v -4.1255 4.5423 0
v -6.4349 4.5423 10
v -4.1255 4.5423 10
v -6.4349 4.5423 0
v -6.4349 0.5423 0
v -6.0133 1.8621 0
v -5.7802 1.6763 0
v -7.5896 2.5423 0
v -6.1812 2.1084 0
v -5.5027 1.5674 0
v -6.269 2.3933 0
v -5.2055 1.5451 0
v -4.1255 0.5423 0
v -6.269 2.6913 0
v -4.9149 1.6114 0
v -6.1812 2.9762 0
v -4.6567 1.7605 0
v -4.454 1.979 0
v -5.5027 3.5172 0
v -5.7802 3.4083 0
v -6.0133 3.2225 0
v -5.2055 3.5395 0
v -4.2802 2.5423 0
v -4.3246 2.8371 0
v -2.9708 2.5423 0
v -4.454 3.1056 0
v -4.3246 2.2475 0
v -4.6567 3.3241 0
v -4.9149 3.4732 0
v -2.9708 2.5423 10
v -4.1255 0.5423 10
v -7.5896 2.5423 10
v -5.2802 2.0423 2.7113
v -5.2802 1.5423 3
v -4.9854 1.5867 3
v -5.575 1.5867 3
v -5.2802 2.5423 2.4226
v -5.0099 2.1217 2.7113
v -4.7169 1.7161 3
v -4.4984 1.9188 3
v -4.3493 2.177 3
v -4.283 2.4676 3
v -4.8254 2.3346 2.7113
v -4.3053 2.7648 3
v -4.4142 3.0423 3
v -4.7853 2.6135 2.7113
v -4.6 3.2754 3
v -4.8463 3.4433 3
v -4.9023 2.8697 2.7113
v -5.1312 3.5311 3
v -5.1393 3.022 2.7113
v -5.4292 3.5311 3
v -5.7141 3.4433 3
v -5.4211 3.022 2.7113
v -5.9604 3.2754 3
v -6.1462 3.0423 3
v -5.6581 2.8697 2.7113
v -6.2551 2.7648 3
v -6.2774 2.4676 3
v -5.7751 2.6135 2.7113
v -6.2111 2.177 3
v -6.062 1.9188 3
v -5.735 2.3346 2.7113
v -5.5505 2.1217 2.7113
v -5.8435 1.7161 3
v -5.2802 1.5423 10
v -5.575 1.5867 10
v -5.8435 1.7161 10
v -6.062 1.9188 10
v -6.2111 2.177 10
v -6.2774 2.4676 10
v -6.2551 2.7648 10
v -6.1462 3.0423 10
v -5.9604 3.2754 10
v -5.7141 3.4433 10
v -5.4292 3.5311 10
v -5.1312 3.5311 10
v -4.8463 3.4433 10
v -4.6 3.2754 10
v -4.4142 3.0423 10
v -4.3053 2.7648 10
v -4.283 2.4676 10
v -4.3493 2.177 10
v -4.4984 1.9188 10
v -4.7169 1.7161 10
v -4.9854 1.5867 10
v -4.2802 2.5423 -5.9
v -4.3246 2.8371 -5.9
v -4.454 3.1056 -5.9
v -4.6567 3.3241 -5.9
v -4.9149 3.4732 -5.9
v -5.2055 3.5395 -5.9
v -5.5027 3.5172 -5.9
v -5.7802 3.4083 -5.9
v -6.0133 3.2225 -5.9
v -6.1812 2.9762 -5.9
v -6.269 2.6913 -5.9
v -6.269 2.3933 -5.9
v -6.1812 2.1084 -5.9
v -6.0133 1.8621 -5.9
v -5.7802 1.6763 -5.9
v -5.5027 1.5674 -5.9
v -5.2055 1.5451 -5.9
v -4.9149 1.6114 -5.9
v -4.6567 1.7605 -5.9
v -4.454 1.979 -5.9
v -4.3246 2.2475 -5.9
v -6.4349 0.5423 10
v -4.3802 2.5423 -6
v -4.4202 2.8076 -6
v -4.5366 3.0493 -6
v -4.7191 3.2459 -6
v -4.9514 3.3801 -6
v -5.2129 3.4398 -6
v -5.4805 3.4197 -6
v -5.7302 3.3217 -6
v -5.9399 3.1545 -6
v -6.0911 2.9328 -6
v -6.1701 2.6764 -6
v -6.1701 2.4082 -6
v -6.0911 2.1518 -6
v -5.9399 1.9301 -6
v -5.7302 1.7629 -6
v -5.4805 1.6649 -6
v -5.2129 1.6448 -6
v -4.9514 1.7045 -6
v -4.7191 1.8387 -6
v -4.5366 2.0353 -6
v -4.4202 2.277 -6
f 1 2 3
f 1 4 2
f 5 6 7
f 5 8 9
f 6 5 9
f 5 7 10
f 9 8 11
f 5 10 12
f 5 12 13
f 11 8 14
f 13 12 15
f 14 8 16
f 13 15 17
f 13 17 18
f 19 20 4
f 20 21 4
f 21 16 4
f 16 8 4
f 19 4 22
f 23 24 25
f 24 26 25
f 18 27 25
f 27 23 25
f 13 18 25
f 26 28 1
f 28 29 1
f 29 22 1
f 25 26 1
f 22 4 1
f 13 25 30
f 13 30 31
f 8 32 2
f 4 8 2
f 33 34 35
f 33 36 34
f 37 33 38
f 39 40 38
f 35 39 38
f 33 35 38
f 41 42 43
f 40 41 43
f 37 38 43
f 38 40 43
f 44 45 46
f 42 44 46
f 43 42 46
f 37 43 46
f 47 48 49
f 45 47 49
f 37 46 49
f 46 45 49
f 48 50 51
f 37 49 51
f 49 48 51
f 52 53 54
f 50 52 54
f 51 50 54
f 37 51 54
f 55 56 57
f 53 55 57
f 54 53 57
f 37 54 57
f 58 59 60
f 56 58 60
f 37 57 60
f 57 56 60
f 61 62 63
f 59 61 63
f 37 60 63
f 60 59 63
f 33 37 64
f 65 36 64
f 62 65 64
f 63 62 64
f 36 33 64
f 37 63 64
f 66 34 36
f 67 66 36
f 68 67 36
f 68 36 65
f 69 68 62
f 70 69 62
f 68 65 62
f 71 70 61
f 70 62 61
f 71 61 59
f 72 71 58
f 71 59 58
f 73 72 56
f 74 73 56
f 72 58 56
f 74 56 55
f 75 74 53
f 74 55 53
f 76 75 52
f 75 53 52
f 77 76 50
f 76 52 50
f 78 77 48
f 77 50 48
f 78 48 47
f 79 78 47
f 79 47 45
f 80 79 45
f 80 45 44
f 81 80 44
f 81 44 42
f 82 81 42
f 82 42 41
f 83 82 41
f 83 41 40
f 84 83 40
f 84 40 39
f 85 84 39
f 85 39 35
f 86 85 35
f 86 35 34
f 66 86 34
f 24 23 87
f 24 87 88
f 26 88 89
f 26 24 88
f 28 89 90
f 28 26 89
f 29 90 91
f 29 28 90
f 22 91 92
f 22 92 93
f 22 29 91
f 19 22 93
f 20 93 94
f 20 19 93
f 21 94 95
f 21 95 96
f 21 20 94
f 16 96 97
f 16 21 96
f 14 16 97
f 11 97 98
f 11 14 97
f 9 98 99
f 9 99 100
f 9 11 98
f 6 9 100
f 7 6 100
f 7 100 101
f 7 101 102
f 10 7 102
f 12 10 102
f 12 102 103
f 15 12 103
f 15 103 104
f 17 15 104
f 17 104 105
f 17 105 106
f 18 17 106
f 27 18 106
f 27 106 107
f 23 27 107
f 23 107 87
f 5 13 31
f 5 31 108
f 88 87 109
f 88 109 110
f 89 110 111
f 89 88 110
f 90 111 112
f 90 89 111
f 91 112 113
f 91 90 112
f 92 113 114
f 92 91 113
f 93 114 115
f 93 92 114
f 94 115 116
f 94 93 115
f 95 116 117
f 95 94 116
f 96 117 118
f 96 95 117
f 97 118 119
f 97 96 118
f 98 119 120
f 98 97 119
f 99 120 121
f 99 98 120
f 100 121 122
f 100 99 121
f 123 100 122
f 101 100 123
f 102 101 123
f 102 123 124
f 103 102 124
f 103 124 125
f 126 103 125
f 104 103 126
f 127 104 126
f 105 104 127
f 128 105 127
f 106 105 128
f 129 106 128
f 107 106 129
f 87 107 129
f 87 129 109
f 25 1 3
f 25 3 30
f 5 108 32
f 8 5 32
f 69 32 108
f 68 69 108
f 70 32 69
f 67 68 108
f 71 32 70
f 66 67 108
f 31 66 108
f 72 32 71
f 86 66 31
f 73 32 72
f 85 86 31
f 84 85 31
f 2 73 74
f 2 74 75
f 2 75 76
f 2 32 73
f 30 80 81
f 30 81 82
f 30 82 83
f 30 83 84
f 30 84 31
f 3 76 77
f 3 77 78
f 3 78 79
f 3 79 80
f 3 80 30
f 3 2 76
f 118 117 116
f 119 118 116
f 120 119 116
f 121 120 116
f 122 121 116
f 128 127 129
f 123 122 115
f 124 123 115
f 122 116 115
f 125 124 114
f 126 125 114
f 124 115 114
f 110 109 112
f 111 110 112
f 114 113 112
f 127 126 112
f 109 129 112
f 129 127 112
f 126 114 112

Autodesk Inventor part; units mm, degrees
ref_plane "YZ Plane" through (0, 0, 0) normal (1, 0, 0) x (0, 1, 0)
ref_plane "XZ Plane" through (0, 0, 0) normal (0, 1, 0) x (-1, 0, 0)
ref_plane "XY Plane" through (0, 0, 0) normal (0, 0, 1) x (1, 0, 0)
sketch "Sketch1" plane through (0, 0, 0) normal (0, 0, 1) x (1, 0, 0)
  line L0 (-7.5896, 2.5423) -> (-6.4349, 4.5423)
  line L1 (-6.4349, 4.5423) -> (-4.1255, 4.5423)
  line L2 (-4.1255, 4.5423) -> (-2.9708, 2.5423)
  line L3 (-2.9708, 2.5423) -> (-4.1255, 0.5423)
  line L4 (-4.1255, 0.5423) -> (-6.4349, 0.5423)
  line L5 (-6.4349, 0.5423) -> (-7.5896, 2.5423)
  circle A0 centre (-5.2802, 2.5423) radius 1
  dimension "d0" = 4
  dimension "d1" = 2
extrude "Extrusion1" add sketch "Sketch1" along normal blind 10 contours L0 L1 L2 L3 L4 L5 | A0
extrude "Extrusion2" add sketch "Sketch1" against normal blind 6 contours A0
sketch "Sketch2" plane through (0, 0, 10) normal (0, 0, 1) x (1, 0, 0)
  circle A0 centre (-5.2802, 2.5423) radius 1 projected
  circle A1 centre (-5.2802, 2.5423) radius 1.5
  point P0 (0, 0)
hole "Hole1" at (-5.2802, 2.5423, 10) direction (0, 0, -1) diameter 2 depth 7 tip angle 120
chamfer "Chamfer1" distance 0.1 angle 45 1 edges at (-6.2802, 2.5423, -6)
thread "Thread3" size "M2x0.4" class "6g" standard "ISO Metric profile" length 6
thread "Thread4" size "M2x0.4" class "6H" standard "ISO Metric profile" length 6
properties part number "Espaciador de Plástico M2 L10" material "Brass, Soft Yellow"
